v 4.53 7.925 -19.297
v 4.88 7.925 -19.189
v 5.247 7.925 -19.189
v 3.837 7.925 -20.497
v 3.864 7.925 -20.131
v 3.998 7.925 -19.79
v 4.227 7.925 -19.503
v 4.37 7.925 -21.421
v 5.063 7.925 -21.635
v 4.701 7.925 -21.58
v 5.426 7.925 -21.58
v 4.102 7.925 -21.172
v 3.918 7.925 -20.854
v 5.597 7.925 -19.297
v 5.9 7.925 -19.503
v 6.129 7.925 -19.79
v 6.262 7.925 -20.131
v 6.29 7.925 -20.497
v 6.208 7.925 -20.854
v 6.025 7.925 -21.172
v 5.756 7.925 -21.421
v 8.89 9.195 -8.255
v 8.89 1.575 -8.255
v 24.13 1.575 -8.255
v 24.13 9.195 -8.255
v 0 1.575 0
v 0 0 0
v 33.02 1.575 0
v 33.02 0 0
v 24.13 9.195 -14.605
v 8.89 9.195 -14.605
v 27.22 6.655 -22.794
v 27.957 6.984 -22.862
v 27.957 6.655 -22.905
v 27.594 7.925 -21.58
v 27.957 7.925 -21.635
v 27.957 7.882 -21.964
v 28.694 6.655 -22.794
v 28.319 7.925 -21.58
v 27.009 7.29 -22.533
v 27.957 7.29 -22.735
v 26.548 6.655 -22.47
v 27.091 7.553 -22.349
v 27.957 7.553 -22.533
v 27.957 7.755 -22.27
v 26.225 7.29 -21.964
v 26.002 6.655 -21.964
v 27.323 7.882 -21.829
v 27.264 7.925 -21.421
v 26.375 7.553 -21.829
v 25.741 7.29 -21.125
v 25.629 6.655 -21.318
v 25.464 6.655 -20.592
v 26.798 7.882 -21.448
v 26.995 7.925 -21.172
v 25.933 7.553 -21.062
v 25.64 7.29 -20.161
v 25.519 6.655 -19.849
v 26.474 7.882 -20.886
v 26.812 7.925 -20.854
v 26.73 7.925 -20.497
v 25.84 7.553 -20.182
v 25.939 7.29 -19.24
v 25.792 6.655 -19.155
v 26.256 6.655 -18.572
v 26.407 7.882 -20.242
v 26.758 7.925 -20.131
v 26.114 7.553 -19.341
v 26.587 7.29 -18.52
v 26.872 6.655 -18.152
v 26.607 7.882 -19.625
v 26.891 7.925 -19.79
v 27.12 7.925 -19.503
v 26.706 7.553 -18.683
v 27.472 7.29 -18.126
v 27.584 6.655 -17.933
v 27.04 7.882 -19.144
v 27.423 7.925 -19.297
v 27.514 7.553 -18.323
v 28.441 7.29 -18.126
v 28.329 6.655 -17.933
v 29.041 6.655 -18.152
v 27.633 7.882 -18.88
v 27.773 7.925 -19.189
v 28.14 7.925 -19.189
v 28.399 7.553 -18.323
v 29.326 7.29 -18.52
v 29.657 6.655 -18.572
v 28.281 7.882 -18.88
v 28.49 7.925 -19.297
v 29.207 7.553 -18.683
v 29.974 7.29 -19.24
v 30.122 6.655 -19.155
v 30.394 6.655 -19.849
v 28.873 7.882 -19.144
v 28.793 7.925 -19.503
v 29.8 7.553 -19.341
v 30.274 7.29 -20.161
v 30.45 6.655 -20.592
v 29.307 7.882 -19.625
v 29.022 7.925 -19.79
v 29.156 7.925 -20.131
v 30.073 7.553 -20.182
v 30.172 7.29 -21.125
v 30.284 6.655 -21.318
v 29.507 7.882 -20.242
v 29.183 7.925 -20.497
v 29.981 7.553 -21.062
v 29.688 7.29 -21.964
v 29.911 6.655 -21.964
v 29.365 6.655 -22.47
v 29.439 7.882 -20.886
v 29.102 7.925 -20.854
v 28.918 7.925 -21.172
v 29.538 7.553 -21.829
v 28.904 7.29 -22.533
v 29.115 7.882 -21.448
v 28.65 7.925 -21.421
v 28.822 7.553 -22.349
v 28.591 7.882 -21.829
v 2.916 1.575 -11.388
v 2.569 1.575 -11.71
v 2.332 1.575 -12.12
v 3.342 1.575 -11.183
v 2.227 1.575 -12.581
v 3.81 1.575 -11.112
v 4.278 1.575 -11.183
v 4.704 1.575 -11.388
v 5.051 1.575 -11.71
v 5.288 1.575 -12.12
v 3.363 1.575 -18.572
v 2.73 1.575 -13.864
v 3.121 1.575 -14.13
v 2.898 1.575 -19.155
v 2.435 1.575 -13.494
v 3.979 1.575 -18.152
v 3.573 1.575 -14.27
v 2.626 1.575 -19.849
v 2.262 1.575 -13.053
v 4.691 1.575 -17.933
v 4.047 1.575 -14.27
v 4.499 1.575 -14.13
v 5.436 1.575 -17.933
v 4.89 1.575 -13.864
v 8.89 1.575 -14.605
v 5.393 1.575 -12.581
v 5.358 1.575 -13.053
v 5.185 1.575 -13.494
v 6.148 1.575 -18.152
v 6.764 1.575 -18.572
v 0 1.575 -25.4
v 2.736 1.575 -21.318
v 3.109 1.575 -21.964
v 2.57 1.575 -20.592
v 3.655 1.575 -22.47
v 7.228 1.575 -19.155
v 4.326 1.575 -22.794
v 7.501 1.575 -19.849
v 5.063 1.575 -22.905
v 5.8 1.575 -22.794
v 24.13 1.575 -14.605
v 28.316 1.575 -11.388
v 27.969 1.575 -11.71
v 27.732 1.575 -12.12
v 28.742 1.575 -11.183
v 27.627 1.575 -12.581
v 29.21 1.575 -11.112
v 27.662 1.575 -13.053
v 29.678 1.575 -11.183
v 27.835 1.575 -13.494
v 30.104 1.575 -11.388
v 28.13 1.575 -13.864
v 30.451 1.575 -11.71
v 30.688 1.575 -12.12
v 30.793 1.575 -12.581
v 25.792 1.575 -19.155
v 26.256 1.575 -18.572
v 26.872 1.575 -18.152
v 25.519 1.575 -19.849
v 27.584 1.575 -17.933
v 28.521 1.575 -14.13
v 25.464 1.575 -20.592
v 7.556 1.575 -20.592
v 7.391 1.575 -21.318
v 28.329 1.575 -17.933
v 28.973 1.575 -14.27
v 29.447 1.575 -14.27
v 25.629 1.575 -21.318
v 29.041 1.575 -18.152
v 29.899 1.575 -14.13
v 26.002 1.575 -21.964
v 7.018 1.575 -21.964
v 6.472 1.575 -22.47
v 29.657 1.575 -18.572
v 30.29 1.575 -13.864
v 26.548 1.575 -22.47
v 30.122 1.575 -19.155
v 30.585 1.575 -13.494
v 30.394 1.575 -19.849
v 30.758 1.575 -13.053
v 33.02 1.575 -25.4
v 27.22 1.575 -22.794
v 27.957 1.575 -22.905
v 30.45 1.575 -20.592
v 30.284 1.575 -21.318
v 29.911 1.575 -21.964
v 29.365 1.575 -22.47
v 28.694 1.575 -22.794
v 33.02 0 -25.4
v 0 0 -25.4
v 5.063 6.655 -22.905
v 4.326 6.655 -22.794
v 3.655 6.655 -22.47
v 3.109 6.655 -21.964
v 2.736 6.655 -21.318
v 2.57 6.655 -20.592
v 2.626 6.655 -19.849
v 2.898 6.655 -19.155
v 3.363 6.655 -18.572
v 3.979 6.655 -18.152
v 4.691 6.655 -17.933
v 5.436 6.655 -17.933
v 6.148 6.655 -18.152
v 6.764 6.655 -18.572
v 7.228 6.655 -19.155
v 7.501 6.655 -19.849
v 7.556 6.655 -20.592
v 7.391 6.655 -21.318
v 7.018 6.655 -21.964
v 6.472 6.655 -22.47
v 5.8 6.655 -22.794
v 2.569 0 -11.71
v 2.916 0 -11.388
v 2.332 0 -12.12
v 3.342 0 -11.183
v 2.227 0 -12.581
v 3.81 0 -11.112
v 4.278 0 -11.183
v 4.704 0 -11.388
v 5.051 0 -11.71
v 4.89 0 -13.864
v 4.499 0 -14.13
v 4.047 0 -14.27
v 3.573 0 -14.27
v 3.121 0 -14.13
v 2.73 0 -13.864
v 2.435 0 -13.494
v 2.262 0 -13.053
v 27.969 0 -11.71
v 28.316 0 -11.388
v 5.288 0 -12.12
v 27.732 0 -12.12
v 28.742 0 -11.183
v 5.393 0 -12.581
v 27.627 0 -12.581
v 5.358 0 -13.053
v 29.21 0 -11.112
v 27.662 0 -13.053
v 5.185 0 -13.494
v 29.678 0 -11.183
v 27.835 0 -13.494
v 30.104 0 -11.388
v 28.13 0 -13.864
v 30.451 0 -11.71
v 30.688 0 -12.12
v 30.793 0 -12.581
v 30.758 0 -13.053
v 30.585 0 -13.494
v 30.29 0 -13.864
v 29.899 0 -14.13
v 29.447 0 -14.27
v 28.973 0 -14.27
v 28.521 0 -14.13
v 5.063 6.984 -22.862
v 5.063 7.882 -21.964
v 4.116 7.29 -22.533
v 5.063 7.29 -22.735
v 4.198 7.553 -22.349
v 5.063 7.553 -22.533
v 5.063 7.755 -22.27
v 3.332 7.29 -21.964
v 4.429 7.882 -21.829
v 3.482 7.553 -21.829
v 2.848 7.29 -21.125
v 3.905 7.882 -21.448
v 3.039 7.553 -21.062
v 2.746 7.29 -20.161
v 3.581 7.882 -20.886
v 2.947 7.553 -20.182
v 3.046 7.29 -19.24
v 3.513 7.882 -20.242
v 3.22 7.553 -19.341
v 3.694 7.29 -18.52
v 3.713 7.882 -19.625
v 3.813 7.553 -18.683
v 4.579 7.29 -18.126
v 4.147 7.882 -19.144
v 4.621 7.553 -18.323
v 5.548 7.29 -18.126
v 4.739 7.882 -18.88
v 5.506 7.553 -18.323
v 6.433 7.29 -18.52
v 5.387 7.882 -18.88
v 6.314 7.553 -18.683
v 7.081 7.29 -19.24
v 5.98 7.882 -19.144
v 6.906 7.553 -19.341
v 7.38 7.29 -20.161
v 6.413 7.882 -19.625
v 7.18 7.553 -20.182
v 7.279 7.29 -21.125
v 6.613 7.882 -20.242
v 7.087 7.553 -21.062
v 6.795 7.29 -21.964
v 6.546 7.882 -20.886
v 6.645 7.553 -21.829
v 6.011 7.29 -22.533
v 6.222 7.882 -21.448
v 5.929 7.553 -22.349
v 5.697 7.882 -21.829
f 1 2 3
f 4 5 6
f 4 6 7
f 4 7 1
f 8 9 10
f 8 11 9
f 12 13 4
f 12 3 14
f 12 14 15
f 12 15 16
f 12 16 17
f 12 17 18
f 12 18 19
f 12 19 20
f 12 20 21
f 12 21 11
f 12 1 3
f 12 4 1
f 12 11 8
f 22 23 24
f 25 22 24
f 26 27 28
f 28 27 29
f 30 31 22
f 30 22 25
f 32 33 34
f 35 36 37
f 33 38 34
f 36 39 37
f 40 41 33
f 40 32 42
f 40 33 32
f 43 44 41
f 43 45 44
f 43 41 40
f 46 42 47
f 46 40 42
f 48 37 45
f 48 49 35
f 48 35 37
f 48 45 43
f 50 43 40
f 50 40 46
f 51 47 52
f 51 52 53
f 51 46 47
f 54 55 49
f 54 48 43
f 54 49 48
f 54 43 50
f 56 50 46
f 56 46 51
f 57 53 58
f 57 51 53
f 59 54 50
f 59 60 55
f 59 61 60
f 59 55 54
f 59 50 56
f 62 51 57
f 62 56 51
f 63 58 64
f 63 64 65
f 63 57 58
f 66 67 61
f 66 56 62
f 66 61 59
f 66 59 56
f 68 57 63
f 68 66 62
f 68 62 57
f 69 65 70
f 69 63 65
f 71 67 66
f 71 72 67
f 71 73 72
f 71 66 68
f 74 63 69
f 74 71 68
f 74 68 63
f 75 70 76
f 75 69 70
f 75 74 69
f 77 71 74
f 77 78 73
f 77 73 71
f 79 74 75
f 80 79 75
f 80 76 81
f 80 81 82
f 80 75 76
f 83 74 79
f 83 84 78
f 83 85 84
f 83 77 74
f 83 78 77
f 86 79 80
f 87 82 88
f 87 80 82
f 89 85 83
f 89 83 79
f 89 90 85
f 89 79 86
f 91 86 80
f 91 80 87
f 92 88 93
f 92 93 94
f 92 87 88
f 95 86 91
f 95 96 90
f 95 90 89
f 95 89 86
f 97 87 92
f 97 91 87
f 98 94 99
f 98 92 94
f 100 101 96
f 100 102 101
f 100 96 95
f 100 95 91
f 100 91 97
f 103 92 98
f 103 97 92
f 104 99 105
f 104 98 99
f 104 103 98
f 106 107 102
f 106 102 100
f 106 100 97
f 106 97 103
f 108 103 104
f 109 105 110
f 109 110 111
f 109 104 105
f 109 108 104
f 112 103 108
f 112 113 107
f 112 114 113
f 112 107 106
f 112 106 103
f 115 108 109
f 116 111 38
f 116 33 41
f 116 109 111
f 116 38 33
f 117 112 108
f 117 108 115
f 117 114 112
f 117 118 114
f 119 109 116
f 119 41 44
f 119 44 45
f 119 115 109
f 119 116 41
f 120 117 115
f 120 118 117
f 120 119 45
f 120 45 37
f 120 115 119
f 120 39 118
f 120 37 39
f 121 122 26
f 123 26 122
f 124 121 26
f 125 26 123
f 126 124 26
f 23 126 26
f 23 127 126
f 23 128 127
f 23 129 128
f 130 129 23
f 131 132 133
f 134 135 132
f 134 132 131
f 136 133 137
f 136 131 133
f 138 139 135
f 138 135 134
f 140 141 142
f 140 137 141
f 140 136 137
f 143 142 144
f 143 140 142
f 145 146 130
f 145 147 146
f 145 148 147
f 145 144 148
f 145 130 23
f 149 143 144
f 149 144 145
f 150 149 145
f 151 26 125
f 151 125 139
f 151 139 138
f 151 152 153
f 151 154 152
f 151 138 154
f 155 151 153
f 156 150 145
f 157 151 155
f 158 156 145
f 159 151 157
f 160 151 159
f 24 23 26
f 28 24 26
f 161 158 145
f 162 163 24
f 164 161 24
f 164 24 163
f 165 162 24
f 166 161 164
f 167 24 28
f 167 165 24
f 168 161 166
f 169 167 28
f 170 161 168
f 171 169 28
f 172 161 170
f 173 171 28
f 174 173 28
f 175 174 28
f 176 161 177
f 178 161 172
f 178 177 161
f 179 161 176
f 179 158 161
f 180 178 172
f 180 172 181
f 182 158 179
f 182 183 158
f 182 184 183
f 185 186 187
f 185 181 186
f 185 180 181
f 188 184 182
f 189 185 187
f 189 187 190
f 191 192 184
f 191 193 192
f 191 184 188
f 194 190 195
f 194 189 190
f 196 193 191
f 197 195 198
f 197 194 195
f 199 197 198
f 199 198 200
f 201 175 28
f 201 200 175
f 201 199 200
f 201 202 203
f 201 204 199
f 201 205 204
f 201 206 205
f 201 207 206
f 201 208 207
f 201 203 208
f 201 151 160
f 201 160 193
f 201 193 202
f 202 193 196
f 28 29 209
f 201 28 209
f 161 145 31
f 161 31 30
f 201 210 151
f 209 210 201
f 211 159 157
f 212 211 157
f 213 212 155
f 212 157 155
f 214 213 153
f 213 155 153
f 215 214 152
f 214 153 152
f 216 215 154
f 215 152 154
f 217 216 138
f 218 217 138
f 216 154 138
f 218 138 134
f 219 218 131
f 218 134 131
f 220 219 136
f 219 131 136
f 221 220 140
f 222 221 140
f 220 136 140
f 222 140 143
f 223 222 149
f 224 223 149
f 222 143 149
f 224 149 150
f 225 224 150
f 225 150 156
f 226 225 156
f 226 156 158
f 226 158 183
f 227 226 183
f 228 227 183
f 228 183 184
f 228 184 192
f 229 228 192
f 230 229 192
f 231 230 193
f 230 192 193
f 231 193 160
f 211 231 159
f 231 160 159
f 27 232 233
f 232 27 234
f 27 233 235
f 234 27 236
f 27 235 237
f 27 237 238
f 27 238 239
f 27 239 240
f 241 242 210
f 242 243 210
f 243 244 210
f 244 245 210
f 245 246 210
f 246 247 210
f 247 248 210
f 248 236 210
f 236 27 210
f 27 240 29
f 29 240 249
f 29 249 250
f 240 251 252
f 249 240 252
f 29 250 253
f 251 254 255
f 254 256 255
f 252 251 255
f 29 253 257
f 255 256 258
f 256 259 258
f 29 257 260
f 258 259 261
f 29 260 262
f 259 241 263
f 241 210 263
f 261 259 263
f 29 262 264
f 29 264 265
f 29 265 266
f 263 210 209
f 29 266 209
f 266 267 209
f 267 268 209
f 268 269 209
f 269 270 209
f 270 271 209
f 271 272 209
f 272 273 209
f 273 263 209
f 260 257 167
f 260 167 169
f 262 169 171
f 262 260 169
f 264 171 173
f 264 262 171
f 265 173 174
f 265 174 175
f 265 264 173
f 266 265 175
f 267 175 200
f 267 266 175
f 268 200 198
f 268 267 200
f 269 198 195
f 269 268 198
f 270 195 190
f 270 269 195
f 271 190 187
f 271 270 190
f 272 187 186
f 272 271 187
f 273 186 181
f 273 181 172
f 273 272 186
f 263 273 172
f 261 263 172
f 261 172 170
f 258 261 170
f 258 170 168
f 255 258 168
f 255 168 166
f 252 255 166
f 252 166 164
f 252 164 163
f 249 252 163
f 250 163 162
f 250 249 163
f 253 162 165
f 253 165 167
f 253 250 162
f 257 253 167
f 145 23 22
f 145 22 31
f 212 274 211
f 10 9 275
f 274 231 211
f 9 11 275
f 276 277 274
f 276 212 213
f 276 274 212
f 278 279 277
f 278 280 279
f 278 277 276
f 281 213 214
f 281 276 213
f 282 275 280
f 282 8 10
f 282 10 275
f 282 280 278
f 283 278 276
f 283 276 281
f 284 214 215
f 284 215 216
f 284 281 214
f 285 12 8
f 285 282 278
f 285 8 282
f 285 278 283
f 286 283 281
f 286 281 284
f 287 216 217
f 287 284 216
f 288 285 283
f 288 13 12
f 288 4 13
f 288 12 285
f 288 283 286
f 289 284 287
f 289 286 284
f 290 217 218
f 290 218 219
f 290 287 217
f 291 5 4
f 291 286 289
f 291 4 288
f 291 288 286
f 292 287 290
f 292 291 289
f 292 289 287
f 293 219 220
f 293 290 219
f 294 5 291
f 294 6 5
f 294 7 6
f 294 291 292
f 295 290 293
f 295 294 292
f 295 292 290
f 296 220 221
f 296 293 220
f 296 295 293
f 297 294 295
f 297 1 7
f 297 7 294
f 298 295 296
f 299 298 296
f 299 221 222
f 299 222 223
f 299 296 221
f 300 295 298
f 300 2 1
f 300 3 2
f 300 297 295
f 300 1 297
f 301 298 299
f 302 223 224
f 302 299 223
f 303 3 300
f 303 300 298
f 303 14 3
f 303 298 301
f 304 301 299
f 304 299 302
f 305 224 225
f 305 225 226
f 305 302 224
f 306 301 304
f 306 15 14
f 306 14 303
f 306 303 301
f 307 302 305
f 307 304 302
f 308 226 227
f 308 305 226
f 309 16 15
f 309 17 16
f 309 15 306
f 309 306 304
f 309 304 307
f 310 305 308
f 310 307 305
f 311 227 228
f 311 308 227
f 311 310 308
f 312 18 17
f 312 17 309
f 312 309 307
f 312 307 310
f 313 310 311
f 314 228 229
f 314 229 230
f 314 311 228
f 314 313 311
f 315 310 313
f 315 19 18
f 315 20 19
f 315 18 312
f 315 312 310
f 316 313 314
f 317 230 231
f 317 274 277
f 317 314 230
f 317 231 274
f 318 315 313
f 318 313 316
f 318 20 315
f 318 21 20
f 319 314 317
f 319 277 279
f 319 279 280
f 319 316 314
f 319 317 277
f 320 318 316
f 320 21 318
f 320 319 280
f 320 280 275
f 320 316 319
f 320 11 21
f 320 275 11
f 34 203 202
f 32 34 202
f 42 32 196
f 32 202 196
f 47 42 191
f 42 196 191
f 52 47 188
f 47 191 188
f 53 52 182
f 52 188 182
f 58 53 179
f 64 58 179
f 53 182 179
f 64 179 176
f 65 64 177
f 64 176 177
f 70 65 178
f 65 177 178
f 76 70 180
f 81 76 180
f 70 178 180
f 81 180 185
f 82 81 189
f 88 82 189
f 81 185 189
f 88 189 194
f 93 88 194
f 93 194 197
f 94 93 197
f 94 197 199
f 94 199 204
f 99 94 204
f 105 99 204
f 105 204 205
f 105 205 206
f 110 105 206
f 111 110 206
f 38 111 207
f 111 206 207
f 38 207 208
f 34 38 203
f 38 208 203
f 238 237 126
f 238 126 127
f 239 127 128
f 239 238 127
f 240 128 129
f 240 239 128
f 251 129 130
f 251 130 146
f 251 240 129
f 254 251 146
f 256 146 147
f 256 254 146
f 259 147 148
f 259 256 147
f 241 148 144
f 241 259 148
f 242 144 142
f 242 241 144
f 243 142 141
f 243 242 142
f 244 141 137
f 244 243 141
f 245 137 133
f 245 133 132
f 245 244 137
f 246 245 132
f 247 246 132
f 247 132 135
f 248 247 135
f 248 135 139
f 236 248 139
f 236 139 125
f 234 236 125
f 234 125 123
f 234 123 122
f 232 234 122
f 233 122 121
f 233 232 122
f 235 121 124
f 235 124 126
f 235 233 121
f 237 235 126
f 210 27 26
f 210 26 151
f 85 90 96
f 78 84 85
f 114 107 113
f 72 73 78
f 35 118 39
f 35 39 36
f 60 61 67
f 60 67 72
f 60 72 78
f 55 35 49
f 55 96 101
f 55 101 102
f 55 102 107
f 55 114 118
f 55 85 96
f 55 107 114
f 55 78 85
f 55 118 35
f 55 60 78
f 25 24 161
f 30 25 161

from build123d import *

# Parameters (mm, degrees)
SKETCH1_W           = 33.02
SKETCH1_H           = 25.4
SKETCH1_R           = 1.5875
BOSS_EXTRUDE1_DEPTH = 1.5748
SKETCH2_W           = 15.24
SKETCH2_H           = 6.35
BOSS_EXTRUDE2_DEPTH = 7.62
SKETCH3_R           = 2.5
BOSS_EXTRUDE3_DEPTH = 6.35
FILLET1_R           = 1.27


with BuildPart() as part:
    # Sketch1 → Boss-Extrude1 (new body)
    with BuildSketch(Plane(origin=(0, 0, 0), x_dir=(1, 0, 0), z_dir=(0, 1, 0))):
        with Locations((16.51, 12.7)):
            Rectangle(SKETCH1_W, SKETCH1_H)
        with Locations(Location((3.81, 12.7, 0), (0, 0, 270))):
            Circle(SKETCH1_R, mode=Mode.SUBTRACT)
        with Locations(Location((29.21, 12.7, 0), (0, 0, 270))):
            Circle(SKETCH1_R, mode=Mode.SUBTRACT)
    extrude(amount=BOSS_EXTRUDE1_DEPTH)

    # Sketch2 → Boss-Extrude2 (add)
    with BuildSketch(Plane(origin=(0, 1.5748, 0), x_dir=(1, 0, 0), z_dir=(0, 1, 0))):
        with Locations((16.51, 11.43)):
            Rectangle(SKETCH2_W, SKETCH2_H)
    extrude(amount=BOSS_EXTRUDE2_DEPTH)

    # Sketch3 → Boss-Extrude3 (add)
    with BuildSketch(Plane(origin=(0, 1.5748, 0), x_dir=(1, 0, 0), z_dir=(0, 1, 0))):
        with Locations(Location((5.063331186, 20.404812086, 0), (0, 0, 90))):
            Circle(SKETCH3_R)
        with Locations(Location((27.956668814, 20.404812086, 0), (0, 0, 90))):
            Circle(SKETCH3_R)
    extrude(amount=BOSS_EXTRUDE3_DEPTH)

    # Fillet1
    fillet1_edges = [part.edges().sort_by_distance(p)[0] for p in [
        (5.063331186, 7.9248, -17.904812086),
        (27.956668814, 7.9248, -17.904812086),
    ]]
    fillet(fillet1_edges, radius=FILLET1_R)


solid = part.part
